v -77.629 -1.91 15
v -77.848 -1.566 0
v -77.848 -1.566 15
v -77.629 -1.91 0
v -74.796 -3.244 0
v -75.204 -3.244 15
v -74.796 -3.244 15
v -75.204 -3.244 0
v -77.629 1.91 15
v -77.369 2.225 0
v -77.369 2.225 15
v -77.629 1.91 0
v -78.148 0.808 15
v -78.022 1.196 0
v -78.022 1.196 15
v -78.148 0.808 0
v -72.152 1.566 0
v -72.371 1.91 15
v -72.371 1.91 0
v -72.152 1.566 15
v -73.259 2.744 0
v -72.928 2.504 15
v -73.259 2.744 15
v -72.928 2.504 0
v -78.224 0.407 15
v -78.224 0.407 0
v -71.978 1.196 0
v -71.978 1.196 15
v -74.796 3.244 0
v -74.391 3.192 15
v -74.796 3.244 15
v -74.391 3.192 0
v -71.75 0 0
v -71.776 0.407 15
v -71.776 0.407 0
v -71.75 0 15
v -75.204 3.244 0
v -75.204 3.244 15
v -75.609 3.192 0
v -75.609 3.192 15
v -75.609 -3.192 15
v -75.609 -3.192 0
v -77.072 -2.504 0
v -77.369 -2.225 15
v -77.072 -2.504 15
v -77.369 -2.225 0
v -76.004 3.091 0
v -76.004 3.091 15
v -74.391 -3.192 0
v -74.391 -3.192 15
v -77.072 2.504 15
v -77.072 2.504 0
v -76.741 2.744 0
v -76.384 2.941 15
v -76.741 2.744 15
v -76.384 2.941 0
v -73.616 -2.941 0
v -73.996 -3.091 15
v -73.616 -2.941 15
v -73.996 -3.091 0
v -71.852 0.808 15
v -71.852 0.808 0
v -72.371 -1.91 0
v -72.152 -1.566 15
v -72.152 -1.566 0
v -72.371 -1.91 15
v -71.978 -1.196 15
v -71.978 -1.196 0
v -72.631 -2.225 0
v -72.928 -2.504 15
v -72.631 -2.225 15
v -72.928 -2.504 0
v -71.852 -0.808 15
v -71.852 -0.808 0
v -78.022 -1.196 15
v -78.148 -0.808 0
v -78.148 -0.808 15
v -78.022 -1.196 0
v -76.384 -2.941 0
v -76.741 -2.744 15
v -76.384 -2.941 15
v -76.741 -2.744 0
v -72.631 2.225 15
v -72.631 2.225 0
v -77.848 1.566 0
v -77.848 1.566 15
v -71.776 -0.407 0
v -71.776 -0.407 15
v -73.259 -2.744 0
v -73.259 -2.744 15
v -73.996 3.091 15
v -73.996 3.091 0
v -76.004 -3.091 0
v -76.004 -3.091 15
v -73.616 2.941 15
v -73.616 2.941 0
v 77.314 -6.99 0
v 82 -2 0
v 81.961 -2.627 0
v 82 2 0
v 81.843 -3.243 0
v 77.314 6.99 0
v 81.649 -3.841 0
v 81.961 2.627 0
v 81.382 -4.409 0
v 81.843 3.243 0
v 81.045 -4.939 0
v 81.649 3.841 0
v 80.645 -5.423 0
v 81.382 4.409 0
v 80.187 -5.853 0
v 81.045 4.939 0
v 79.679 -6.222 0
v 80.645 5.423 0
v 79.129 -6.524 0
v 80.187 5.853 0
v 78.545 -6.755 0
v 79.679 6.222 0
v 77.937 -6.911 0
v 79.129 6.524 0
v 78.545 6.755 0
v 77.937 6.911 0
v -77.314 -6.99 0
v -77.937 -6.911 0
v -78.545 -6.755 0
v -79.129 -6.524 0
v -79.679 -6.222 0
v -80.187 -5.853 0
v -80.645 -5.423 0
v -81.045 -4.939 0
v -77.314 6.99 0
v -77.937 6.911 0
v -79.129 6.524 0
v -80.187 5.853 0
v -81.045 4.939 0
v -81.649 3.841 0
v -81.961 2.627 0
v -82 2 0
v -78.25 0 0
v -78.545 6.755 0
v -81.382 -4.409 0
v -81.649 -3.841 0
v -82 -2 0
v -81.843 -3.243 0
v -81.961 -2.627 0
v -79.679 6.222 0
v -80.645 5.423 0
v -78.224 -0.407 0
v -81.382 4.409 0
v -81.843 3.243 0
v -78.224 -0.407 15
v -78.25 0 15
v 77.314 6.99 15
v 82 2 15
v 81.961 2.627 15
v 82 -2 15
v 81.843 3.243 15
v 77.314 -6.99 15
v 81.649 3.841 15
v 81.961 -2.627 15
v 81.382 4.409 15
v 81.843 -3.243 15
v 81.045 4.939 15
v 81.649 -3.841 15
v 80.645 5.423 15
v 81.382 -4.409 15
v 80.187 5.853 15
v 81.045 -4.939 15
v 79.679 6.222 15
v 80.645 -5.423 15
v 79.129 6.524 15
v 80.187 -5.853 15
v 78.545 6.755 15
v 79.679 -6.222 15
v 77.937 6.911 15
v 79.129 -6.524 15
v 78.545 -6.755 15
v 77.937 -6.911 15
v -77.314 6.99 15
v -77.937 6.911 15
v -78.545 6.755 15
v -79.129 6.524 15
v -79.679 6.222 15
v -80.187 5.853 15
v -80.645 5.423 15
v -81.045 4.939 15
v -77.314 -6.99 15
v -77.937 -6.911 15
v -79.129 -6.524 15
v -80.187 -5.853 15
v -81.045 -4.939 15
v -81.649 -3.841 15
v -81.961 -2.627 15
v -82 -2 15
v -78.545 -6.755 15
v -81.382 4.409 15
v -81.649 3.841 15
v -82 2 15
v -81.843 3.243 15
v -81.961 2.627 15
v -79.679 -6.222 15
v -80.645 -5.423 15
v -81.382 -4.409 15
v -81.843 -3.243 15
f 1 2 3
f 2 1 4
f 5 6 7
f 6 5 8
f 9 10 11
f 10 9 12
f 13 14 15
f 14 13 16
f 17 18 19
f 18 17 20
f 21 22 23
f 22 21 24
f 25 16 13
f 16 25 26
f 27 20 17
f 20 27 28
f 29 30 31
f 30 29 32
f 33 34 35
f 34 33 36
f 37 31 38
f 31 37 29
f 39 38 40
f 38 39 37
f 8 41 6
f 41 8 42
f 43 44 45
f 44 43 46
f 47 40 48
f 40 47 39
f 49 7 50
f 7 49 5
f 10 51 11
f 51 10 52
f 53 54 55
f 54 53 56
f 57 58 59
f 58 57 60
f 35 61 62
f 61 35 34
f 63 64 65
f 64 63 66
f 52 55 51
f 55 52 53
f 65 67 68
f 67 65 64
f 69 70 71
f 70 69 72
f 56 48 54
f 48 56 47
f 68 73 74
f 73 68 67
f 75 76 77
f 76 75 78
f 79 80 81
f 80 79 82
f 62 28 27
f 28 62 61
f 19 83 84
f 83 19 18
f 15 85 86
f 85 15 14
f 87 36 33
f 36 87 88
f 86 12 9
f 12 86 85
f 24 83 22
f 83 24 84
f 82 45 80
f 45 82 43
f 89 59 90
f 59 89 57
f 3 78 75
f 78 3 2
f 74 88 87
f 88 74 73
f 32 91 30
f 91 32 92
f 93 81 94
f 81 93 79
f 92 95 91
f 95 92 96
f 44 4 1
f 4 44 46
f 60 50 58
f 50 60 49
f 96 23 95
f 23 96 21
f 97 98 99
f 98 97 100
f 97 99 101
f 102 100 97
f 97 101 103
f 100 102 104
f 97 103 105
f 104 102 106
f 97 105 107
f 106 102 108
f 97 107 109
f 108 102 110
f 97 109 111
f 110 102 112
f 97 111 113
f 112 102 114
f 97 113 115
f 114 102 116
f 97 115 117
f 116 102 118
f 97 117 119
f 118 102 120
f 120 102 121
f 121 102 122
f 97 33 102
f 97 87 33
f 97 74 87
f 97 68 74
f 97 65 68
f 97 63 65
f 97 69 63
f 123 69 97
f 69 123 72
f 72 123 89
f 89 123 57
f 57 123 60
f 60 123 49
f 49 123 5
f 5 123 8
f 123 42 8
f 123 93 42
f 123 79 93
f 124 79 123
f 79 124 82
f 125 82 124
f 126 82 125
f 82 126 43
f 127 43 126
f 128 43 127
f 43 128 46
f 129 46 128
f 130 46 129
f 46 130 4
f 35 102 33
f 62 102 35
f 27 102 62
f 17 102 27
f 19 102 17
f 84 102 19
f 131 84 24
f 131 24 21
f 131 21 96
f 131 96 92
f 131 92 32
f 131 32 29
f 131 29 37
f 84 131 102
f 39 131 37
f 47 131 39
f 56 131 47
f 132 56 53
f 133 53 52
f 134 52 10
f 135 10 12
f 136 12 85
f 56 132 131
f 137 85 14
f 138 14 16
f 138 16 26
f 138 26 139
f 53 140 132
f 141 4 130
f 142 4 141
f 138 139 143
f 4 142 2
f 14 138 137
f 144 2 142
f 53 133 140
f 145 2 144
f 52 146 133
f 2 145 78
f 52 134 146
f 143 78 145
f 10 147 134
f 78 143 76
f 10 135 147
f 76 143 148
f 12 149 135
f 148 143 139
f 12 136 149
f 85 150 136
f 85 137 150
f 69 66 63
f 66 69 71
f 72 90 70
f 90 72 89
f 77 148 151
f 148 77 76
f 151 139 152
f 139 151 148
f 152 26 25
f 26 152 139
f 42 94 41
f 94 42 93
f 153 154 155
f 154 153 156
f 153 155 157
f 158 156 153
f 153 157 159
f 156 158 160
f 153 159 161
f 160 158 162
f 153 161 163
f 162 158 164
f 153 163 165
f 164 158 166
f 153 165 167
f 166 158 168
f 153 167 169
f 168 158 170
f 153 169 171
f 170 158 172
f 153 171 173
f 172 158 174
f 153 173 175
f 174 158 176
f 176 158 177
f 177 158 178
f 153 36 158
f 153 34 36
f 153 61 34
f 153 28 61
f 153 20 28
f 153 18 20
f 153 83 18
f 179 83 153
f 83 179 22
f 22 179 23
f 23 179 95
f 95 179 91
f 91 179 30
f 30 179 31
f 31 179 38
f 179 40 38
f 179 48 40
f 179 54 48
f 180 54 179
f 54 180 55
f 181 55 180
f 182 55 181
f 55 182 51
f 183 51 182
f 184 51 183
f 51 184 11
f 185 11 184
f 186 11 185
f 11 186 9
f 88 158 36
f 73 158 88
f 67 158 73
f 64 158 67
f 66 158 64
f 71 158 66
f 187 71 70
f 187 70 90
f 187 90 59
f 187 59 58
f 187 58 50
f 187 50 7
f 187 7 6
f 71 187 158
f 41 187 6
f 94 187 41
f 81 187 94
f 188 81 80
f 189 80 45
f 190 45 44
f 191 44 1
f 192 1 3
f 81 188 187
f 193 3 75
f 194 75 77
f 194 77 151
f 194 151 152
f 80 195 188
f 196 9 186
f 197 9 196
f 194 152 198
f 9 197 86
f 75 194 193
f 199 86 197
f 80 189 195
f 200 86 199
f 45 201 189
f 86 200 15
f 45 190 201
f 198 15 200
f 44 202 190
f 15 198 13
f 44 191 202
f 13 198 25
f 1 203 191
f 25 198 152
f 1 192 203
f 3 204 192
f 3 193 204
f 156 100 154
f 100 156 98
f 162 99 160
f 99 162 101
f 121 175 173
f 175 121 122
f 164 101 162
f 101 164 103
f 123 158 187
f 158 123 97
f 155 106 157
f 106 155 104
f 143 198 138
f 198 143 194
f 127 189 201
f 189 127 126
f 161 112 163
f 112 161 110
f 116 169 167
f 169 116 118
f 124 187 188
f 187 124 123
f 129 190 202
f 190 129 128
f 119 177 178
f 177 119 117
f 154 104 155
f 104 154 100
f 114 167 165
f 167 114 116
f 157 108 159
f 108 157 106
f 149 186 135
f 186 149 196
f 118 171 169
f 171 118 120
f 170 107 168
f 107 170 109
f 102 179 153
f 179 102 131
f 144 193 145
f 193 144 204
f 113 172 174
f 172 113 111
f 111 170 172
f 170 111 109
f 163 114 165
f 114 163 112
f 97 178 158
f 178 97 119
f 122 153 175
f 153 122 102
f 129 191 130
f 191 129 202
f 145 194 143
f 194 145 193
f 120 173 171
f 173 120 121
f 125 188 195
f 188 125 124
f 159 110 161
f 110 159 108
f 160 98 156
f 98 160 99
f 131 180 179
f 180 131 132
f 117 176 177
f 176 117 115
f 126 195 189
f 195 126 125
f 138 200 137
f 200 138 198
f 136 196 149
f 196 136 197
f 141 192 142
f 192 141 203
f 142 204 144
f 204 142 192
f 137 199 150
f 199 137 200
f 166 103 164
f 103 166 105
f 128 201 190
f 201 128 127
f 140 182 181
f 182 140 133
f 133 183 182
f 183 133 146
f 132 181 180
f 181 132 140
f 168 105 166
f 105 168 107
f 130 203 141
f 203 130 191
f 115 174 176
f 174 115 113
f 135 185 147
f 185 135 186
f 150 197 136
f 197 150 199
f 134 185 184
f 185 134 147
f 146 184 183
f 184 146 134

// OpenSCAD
$fn = 50;


difference() {
	union() {
		hull() {
			translate(v = [-77.0000000000, 2.0000000000, 0]) {
				cylinder(h = 15, r = 5);
			}
			translate(v = [77.0000000000, 2.0000000000, 0]) {
				cylinder(h = 15, r = 5);
			}
			translate(v = [-77.0000000000, -2.0000000000, 0]) {
				cylinder(h = 15, r = 5);
			}
			translate(v = [77.0000000000, -2.0000000000, 0]) {
				cylinder(h = 15, r = 5);
			}
		}
	}
	union() {
		translate(v = [-75.0000000000, 0.0000000000, 0]) {
			cylinder(h = 15, r = 3.2500000000);
		}
		translate(v = [-75.0000000000, 0.0000000000, 0]) {
			cylinder(h = 15, r = 1.8000000000);
		}
		translate(v = [-75.0000000000, 0.0000000000, 0]) {
			cylinder(h = 15, r = 1.8000000000);
		}
		translate(v = [-75.0000000000, 0.0000000000, 0]) {
			cylinder(h = 15, r = 1.8000000000);
		}
	}
}
